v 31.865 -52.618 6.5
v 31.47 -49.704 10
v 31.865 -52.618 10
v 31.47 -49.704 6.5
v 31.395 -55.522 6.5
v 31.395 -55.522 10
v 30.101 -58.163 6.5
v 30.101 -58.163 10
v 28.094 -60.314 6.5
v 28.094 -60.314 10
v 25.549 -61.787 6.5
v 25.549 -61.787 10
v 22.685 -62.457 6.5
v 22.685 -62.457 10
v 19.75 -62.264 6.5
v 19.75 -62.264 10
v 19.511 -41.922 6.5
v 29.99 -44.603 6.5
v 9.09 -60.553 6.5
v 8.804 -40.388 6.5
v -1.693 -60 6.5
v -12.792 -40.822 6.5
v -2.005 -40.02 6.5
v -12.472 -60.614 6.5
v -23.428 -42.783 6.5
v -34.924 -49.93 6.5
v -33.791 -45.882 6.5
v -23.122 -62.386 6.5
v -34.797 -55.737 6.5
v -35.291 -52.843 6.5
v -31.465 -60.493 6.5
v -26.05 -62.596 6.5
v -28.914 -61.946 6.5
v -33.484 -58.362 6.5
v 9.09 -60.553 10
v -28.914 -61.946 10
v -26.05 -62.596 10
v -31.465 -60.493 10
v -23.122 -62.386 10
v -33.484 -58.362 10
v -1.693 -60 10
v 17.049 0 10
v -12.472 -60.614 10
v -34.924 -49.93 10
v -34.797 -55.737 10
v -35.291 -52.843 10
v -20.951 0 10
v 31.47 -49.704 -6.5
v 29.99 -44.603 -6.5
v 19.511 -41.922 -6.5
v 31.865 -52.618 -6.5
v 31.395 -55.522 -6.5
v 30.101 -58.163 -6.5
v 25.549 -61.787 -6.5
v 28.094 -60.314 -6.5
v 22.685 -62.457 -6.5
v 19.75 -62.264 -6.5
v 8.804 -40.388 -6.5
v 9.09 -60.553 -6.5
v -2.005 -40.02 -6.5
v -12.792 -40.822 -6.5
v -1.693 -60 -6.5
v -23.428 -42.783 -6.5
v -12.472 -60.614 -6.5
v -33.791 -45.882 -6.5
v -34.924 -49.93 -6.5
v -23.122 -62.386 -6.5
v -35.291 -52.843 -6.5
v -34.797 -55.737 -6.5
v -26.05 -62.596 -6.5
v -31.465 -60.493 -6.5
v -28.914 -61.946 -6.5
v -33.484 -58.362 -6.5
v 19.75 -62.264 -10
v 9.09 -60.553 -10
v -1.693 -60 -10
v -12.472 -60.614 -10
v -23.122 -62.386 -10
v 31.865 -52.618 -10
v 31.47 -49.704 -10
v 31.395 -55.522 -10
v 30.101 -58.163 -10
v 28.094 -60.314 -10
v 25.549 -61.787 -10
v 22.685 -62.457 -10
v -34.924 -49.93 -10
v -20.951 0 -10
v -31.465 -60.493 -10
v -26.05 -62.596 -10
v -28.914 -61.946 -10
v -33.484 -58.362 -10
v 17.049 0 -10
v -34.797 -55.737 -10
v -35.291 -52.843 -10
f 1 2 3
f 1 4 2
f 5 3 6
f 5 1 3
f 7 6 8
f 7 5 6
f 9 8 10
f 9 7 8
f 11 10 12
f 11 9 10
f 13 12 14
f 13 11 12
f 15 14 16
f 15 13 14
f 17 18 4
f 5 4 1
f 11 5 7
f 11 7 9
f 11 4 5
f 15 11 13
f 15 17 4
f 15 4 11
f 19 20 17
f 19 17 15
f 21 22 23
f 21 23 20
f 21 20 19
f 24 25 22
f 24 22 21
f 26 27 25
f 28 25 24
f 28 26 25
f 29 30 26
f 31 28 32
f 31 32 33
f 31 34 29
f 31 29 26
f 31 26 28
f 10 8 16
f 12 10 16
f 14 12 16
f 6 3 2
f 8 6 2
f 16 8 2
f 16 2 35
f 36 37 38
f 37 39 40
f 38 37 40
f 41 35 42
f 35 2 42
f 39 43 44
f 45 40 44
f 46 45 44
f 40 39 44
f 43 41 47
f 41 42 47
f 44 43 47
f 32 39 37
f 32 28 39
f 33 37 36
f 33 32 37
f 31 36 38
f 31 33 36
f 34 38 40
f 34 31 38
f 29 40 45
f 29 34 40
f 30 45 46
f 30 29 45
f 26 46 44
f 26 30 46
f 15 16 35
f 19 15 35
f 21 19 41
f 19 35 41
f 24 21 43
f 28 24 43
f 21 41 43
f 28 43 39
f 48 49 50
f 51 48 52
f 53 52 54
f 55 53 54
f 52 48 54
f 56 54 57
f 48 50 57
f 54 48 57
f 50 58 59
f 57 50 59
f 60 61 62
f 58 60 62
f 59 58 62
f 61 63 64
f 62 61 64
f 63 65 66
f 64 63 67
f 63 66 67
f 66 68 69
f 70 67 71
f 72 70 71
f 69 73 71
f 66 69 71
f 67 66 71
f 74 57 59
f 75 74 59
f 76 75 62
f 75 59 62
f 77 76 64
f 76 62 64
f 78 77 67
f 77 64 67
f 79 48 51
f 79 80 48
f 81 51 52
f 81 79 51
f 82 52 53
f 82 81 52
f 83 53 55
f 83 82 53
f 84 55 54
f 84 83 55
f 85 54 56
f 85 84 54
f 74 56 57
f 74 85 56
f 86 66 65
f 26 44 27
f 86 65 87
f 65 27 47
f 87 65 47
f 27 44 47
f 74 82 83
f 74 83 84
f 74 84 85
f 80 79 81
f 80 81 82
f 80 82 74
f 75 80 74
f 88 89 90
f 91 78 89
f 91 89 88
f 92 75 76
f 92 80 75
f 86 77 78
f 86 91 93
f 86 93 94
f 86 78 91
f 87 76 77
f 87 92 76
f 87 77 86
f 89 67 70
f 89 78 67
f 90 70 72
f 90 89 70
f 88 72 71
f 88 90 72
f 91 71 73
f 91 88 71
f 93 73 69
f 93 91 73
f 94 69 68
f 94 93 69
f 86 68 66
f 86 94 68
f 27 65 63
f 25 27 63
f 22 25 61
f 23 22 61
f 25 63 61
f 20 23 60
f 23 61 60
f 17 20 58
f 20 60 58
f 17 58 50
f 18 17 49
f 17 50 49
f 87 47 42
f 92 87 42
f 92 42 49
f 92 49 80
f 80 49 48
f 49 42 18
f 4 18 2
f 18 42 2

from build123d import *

# Parameters (mm, degrees)
BOSS_EXTRUDE1_DEPTH = 10
SKETCH5_W           = 13
SKETCH5_H           = 100
FILLET1_R           = 10


with BuildPart() as part:
    # Sketch1 → Boss-Extrude1 (new body, symmetric)
    with BuildSketch(Plane.XY):
        with BuildLine():
            Line((17.04861701, 0), (36.638934873, -67.52052444))
            ThreePointArc((36.638934873, -67.52052444), (-1.647556066, -60.00028765), (-39.897531443, -67.704100565))
            Line((-39.897531443, -67.704100565), (-20.95138299, 0))
            Line((-20.95138299, 0), (17.04861701, 0))
        make_face()
    extrude(amount=BOSS_EXTRUDE1_DEPTH, both=True)

    # Sketch5 → Cut-Revolve2 (revolve, cut)
    with BuildSketch(Plane(origin=(0, 0, 0), x_dir=(0, 0, -1), z_dir=(1, 0, 0))):
        with Locations((0, -190)):
            Rectangle(SKETCH5_W, SKETCH5_H)
    revolve(axis=Axis((0, -140, 0), (0, 0, -1)), mode=Mode.SUBTRACT)

    # Fillet1
    fillet1_edges = [part.edges().sort_by_distance(p)[0] for p in [
        (36.638934873, -67.52052444, -8.25),
        (-39.897531443, -67.704100565, -8.25),
        (-39.897531443, -67.704100565, 8.25),
        (36.638934873, -67.52052444, 8.25),
    ]]
    fillet(fillet1_edges, radius=FILLET1_R)


solid = part.part
